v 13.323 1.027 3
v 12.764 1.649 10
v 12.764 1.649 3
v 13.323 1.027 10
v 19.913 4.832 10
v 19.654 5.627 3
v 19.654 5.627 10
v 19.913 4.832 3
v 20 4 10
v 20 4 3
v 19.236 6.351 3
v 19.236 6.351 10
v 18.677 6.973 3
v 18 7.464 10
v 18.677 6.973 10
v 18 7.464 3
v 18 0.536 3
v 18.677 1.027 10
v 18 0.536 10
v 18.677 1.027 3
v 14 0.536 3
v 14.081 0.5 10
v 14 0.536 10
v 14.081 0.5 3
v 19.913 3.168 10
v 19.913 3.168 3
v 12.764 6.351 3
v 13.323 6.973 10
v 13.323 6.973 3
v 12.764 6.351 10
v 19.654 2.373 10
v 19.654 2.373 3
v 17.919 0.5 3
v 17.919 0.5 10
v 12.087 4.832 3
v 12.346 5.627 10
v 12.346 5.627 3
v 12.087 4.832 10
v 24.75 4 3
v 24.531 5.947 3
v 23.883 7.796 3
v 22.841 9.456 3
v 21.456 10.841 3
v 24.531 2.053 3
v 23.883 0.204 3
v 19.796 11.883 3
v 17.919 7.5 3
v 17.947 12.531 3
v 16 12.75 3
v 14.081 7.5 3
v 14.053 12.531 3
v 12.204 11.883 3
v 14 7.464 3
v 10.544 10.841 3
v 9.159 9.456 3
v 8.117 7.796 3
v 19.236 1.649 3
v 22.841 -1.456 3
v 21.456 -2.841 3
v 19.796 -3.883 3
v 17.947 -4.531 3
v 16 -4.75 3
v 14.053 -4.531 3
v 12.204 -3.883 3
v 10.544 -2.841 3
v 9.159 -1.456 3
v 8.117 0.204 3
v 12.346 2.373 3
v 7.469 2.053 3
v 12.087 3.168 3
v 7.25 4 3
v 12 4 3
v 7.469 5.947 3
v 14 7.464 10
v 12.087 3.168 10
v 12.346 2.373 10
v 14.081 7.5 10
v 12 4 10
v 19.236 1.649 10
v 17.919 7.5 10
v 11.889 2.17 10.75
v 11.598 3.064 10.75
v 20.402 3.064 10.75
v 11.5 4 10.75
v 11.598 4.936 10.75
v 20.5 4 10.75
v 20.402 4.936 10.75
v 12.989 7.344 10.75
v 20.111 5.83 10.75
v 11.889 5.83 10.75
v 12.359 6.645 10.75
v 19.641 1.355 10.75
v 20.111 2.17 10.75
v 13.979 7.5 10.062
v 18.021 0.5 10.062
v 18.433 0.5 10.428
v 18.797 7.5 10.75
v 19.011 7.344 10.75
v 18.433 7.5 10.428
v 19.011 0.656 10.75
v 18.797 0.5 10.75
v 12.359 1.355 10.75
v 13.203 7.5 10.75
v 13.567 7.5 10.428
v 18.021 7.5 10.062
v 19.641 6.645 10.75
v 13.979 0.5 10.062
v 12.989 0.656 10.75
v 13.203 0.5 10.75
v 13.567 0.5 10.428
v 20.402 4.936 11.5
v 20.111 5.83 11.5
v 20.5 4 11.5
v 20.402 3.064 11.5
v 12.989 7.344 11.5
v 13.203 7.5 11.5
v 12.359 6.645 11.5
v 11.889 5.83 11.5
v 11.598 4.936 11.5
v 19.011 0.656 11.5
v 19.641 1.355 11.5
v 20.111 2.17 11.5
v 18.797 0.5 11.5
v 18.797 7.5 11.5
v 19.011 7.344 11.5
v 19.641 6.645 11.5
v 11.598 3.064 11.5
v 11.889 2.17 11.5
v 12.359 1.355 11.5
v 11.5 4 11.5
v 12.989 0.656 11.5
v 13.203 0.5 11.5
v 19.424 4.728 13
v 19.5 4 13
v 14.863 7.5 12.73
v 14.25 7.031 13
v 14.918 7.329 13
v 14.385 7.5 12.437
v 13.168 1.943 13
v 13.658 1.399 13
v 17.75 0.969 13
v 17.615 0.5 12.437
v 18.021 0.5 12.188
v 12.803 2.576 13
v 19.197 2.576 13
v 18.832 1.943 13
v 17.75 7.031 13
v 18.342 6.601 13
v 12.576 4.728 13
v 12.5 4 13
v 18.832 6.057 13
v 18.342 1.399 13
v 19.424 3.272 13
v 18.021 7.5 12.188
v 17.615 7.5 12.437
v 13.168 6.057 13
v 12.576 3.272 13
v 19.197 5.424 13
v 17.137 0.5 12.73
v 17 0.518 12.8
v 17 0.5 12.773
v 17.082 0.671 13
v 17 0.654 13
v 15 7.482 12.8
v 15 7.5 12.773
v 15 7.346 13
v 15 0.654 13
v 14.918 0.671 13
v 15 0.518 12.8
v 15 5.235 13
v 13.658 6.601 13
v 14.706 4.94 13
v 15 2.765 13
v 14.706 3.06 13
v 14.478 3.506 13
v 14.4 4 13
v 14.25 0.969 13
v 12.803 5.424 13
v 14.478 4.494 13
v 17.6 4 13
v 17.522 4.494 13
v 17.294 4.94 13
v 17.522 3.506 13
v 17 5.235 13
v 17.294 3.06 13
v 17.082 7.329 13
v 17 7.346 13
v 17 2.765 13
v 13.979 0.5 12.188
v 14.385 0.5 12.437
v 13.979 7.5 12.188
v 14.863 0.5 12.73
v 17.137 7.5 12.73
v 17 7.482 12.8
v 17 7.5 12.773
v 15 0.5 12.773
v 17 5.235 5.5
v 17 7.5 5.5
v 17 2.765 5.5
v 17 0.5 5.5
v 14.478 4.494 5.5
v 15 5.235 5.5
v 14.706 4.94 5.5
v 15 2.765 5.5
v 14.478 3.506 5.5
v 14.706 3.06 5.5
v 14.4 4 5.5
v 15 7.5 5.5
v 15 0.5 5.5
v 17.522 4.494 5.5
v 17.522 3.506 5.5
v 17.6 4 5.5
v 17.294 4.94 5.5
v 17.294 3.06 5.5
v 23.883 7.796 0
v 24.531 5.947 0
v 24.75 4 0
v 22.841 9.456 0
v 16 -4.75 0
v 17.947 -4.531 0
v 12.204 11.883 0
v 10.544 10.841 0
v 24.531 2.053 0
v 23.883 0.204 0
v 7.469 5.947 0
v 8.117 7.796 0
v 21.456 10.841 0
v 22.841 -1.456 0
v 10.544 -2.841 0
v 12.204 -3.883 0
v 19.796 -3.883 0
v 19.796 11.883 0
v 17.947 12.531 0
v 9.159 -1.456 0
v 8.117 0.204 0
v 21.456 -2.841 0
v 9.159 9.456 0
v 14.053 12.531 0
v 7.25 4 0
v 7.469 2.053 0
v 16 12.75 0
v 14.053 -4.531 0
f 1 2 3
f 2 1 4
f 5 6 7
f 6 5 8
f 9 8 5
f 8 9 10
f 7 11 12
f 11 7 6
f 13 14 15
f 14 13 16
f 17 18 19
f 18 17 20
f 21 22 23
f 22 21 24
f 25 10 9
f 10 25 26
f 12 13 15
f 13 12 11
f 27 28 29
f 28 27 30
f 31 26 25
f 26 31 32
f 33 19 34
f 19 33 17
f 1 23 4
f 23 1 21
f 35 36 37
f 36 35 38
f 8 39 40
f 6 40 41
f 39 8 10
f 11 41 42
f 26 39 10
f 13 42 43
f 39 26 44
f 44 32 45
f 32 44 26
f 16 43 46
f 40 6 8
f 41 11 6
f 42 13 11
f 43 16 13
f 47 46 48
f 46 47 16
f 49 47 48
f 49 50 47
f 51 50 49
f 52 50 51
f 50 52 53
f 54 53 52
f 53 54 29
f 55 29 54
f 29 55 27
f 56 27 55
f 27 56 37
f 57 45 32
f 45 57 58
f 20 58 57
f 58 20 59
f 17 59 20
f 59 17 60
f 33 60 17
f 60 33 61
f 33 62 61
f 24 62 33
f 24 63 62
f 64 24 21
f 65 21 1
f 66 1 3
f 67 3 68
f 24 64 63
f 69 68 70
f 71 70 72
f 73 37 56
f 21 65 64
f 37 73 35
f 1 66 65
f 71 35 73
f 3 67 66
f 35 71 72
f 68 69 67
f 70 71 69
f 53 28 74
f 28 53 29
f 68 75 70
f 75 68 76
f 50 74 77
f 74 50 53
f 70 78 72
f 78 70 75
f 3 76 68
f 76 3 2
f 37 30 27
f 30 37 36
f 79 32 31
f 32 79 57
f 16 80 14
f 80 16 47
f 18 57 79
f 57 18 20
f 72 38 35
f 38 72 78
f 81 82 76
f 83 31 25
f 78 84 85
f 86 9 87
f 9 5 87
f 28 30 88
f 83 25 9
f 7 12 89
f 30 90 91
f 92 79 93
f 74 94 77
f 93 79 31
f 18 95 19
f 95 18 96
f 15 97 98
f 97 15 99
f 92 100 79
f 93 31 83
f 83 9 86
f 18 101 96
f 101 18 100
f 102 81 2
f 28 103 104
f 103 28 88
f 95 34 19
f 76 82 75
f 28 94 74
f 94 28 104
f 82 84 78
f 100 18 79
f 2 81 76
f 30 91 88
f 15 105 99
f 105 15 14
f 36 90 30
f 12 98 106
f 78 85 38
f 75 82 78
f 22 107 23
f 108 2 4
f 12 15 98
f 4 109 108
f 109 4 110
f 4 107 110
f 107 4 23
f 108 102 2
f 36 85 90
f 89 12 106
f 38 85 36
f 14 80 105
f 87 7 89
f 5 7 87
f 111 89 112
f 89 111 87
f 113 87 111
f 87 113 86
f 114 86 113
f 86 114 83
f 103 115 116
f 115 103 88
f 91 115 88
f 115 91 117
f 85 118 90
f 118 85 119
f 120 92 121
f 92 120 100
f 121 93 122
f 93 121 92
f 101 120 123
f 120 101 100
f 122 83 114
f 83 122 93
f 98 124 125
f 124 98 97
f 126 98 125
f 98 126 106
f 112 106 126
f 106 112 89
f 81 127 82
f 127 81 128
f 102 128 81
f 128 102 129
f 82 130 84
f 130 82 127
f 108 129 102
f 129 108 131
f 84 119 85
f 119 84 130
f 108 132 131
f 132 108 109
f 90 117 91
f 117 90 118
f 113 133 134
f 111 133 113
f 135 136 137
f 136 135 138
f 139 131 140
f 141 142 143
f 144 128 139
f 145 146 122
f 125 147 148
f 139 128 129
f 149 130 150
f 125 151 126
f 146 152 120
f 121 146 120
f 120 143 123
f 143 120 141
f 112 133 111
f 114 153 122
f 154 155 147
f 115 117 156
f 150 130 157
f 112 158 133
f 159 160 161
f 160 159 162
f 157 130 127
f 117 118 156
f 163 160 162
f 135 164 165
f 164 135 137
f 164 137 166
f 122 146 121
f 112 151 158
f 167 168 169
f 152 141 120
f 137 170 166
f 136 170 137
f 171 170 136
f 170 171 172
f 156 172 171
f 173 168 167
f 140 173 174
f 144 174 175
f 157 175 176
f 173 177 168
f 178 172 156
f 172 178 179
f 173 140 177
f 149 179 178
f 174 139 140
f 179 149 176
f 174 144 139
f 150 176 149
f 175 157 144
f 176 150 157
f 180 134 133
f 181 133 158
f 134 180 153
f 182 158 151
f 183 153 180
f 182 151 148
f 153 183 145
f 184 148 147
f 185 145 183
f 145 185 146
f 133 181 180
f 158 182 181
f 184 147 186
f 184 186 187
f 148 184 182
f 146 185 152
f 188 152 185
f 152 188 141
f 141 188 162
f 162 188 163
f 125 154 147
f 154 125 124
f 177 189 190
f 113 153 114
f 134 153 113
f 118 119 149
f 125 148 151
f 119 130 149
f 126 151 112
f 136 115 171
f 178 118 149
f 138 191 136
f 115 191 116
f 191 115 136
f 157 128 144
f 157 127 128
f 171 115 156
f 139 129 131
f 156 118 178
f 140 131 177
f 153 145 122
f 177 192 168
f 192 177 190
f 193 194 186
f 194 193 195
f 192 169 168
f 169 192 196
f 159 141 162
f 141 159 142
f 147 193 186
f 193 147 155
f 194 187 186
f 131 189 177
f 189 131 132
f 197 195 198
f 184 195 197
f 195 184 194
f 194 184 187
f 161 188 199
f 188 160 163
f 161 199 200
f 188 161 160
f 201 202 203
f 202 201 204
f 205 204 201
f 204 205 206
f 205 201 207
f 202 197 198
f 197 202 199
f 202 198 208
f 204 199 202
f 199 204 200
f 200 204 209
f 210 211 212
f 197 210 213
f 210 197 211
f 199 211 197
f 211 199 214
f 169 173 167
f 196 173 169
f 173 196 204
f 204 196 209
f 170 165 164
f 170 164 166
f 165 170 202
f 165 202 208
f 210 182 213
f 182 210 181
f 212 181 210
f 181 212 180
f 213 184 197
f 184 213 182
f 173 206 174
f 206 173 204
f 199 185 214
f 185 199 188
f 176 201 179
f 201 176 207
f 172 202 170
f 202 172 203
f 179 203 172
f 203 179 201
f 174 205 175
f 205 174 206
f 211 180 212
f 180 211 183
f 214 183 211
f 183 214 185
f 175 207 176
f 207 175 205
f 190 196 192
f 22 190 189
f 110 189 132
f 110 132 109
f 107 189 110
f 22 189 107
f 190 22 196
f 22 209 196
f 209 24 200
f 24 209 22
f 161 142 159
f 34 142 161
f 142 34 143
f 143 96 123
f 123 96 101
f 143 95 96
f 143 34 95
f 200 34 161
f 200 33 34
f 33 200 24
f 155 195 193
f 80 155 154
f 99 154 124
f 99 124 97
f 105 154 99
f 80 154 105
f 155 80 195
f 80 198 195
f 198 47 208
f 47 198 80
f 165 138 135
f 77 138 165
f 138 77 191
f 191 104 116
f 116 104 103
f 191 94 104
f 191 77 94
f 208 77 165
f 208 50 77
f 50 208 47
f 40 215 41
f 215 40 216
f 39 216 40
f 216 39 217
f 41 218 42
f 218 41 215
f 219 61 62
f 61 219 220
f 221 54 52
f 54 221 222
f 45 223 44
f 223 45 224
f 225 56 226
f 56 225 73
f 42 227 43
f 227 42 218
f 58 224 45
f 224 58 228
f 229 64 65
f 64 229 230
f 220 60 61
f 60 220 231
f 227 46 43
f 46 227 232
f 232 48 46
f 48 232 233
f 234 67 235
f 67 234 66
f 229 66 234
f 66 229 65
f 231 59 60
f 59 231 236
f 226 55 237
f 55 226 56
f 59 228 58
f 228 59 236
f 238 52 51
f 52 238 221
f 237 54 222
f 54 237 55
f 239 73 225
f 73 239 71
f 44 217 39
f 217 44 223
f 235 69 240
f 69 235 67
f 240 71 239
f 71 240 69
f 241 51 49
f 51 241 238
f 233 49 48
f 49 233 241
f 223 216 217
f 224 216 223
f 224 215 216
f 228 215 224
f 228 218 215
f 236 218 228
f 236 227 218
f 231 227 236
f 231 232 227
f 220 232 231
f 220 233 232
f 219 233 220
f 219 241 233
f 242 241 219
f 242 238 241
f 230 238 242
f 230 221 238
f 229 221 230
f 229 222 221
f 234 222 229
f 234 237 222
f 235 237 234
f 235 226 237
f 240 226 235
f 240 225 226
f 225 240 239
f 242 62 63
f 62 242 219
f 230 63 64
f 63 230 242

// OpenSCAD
// Pin Connectors V2
// Tony Buser <tbuser@gmail.com>

// dimensions
x = 76;
y = 17;
z = 5.0;

//radii pins
r = 1.8;
R = 4;

y_off = 4;
//pin 1
x_off = 16;
translate([x_off,y_off,0]) pintack(h=10);



module test() {
  tolerance = 0.3;
  
  translate([-12, 12, 0]) pinpeg(h=20);
  translate([12, 12, 0]) pintack(h=10);
  
  difference() {
    union() {
      translate([0, -12, 2.5]) cube(size = [59, 20, 5], center = true);
      translate([24, -12, 7.5]) cube(size = [12, 20, 15], center = true);
    }
    translate([-24, -12, 0]) pinhole(h=5, t=tolerance);
    translate([-12, -12, 0]) pinhole(h=5, t=tolerance, tight=false);
    translate([0, -12, 0]) pinhole(h=10, t=tolerance);
    translate([12, -12, 0]) pinhole(h=10, t=tolerance, tight=false);
    translate([24, -12, 15]) rotate([0, 180, 0]) pinhole(h=10, t=tolerance);
  }
}

module pinhole(h=10, r=4, lh=3, lt=1, t=0.3, tight=true) {
  // h = shaft height
  // r = shaft radius
  // lh = lip height
  // lt = lip thickness
  // t = tolerance
  // tight = set to false if you want a joint that spins easily
  
  union() {
    pin_solid(h, r+(t/2), lh, lt);
    cylinder(h=h+0.2, r=r);
    // widen the cylinder slightly
    // cylinder(h=h+0.2, r=r+(t-0.2/2));
    if (tight == false) {
      cylinder(h=h+0.2, r=r+(t/2)+0.25);
    }
    // widen the entrance hole to make insertion easier
    translate([0, 0, -0.1]) cylinder(h=lh/3, r2=r, r1=r+(t/2)+(lt/2));
  }
}

module pin(h=10, r=4, lh=3, lt=1, side=false) {
  // h = shaft height
  // r = shaft radius
  // lh = lip height
  // lt = lip thickness
  // side = set to true if you want it printed horizontally

  if (side) {
    pin_horizontal(h, r, lh, lt);
  } else {
    pin_vertical(h, r, lh, lt);
  }
}

module pintack(h=10, r=4, lh=3, lt=1, bh=3, br=8.75) {
  // bh = base_height
  // br = base_radius
  
  union() {
    cylinder(h=bh, r=br);
    translate([0, 0, bh]) pin(h, r, lh, lt);
  }
}

module pinpeg(h=20, r=4, lh=3, lt=1) {
  union() {
    translate([0, -h/4+0.05, 0]) pin(h/2+0.1, r, lh, lt, side=true);
    translate([0, h/4-0.05, 0]) rotate([0, 0, 180]) pin(h/2+0.1, r, lh, lt, side=true);
  }
}

// just call pin instead, I made this module because it was easier to do the rotation option this way
// since openscad complains of recursion if I did it all in one module
module pin_vertical(h=10, r=4, lh=3, lt=1) {
  // h = shaft height
  // r = shaft radius
  // lh = lip height
  // lt = lip thickness

  difference() {
    pin_solid(h, r, lh, lt);
    
    // center cut
    translate([-r*0.5/2, -(r*2+lt*2)/2, h/4]) cube([r*0.5, r*2+lt*2, h]);
    translate([0, 0, h/4]) cylinder(h=h+lh, r=r/2.5, $fn=20);
    // center curve
    // translate([0, 0, h/4]) rotate([90, 0, 0]) cylinder(h=r*2, r=r*0.5/2, center=true, $fn=20);
  
    // side cuts
    translate([-r*2, -lt-r*1.125, -1]) cube([r*4, lt*2, h+2]);
    translate([-r*2, -lt+r*1.125, -1]) cube([r*4, lt*2, h+2]);
  }
}

// call pin with side=true instead of this
module pin_horizontal(h=10, r=4, lh=3, lt=1) {
  // h = shaft height
  // r = shaft radius
  // lh = lip height
  // lt = lip thickness
  translate([0, h/2, r*1.125-lt]) rotate([90, 0, 0]) pin_vertical(h, r, lh, lt);
}

// this is mainly to make the pinhole module easier
module pin_solid(h=10, r=4, lh=3, lt=1) {
  union() {
    // shaft
    cylinder(h=h-lh, r=r, $fn=30);
    // lip
    // translate([0, 0, h-lh]) cylinder(h=lh*0.25, r1=r, r2=r+(lt/2), $fn=30);
    // translate([0, 0, h-lh+lh*0.25]) cylinder(h=lh*0.25, r2=r, r1=r+(lt/2), $fn=30);
    // translate([0, 0, h-lh+lh*0.50]) cylinder(h=lh*0.50, r1=r, r2=r-(lt/2), $fn=30);

    // translate([0, 0, h-lh]) cylinder(h=lh*0.50, r1=r, r2=r+(lt/2), $fn=30);
    // translate([0, 0, h-lh+lh*0.50]) cylinder(h=lh*0.50, r1=r+(lt/2), r2=r-(lt/3), $fn=30);    

    translate([0, 0, h-lh]) cylinder(h=lh*0.25, r1=r, r2=r+(lt/2), $fn=30);
    translate([0, 0, h-lh+lh*0.25]) cylinder(h=lh*0.25, r=r+(lt/2), $fn=30);    
    translate([0, 0, h-lh+lh*0.50]) cylinder(h=lh*0.50, r1=r+(lt/2), r2=r-(lt/2), $fn=30);    

    // translate([0, 0, h-lh]) cylinder(h=lh, r1=r+(lt/2), r2=1, $fn=30);
    // translate([0, 0, h-lh-lt/2]) cylinder(h=lt/2, r1=r, r2=r+(lt/2), $fn=30);
  }
}
